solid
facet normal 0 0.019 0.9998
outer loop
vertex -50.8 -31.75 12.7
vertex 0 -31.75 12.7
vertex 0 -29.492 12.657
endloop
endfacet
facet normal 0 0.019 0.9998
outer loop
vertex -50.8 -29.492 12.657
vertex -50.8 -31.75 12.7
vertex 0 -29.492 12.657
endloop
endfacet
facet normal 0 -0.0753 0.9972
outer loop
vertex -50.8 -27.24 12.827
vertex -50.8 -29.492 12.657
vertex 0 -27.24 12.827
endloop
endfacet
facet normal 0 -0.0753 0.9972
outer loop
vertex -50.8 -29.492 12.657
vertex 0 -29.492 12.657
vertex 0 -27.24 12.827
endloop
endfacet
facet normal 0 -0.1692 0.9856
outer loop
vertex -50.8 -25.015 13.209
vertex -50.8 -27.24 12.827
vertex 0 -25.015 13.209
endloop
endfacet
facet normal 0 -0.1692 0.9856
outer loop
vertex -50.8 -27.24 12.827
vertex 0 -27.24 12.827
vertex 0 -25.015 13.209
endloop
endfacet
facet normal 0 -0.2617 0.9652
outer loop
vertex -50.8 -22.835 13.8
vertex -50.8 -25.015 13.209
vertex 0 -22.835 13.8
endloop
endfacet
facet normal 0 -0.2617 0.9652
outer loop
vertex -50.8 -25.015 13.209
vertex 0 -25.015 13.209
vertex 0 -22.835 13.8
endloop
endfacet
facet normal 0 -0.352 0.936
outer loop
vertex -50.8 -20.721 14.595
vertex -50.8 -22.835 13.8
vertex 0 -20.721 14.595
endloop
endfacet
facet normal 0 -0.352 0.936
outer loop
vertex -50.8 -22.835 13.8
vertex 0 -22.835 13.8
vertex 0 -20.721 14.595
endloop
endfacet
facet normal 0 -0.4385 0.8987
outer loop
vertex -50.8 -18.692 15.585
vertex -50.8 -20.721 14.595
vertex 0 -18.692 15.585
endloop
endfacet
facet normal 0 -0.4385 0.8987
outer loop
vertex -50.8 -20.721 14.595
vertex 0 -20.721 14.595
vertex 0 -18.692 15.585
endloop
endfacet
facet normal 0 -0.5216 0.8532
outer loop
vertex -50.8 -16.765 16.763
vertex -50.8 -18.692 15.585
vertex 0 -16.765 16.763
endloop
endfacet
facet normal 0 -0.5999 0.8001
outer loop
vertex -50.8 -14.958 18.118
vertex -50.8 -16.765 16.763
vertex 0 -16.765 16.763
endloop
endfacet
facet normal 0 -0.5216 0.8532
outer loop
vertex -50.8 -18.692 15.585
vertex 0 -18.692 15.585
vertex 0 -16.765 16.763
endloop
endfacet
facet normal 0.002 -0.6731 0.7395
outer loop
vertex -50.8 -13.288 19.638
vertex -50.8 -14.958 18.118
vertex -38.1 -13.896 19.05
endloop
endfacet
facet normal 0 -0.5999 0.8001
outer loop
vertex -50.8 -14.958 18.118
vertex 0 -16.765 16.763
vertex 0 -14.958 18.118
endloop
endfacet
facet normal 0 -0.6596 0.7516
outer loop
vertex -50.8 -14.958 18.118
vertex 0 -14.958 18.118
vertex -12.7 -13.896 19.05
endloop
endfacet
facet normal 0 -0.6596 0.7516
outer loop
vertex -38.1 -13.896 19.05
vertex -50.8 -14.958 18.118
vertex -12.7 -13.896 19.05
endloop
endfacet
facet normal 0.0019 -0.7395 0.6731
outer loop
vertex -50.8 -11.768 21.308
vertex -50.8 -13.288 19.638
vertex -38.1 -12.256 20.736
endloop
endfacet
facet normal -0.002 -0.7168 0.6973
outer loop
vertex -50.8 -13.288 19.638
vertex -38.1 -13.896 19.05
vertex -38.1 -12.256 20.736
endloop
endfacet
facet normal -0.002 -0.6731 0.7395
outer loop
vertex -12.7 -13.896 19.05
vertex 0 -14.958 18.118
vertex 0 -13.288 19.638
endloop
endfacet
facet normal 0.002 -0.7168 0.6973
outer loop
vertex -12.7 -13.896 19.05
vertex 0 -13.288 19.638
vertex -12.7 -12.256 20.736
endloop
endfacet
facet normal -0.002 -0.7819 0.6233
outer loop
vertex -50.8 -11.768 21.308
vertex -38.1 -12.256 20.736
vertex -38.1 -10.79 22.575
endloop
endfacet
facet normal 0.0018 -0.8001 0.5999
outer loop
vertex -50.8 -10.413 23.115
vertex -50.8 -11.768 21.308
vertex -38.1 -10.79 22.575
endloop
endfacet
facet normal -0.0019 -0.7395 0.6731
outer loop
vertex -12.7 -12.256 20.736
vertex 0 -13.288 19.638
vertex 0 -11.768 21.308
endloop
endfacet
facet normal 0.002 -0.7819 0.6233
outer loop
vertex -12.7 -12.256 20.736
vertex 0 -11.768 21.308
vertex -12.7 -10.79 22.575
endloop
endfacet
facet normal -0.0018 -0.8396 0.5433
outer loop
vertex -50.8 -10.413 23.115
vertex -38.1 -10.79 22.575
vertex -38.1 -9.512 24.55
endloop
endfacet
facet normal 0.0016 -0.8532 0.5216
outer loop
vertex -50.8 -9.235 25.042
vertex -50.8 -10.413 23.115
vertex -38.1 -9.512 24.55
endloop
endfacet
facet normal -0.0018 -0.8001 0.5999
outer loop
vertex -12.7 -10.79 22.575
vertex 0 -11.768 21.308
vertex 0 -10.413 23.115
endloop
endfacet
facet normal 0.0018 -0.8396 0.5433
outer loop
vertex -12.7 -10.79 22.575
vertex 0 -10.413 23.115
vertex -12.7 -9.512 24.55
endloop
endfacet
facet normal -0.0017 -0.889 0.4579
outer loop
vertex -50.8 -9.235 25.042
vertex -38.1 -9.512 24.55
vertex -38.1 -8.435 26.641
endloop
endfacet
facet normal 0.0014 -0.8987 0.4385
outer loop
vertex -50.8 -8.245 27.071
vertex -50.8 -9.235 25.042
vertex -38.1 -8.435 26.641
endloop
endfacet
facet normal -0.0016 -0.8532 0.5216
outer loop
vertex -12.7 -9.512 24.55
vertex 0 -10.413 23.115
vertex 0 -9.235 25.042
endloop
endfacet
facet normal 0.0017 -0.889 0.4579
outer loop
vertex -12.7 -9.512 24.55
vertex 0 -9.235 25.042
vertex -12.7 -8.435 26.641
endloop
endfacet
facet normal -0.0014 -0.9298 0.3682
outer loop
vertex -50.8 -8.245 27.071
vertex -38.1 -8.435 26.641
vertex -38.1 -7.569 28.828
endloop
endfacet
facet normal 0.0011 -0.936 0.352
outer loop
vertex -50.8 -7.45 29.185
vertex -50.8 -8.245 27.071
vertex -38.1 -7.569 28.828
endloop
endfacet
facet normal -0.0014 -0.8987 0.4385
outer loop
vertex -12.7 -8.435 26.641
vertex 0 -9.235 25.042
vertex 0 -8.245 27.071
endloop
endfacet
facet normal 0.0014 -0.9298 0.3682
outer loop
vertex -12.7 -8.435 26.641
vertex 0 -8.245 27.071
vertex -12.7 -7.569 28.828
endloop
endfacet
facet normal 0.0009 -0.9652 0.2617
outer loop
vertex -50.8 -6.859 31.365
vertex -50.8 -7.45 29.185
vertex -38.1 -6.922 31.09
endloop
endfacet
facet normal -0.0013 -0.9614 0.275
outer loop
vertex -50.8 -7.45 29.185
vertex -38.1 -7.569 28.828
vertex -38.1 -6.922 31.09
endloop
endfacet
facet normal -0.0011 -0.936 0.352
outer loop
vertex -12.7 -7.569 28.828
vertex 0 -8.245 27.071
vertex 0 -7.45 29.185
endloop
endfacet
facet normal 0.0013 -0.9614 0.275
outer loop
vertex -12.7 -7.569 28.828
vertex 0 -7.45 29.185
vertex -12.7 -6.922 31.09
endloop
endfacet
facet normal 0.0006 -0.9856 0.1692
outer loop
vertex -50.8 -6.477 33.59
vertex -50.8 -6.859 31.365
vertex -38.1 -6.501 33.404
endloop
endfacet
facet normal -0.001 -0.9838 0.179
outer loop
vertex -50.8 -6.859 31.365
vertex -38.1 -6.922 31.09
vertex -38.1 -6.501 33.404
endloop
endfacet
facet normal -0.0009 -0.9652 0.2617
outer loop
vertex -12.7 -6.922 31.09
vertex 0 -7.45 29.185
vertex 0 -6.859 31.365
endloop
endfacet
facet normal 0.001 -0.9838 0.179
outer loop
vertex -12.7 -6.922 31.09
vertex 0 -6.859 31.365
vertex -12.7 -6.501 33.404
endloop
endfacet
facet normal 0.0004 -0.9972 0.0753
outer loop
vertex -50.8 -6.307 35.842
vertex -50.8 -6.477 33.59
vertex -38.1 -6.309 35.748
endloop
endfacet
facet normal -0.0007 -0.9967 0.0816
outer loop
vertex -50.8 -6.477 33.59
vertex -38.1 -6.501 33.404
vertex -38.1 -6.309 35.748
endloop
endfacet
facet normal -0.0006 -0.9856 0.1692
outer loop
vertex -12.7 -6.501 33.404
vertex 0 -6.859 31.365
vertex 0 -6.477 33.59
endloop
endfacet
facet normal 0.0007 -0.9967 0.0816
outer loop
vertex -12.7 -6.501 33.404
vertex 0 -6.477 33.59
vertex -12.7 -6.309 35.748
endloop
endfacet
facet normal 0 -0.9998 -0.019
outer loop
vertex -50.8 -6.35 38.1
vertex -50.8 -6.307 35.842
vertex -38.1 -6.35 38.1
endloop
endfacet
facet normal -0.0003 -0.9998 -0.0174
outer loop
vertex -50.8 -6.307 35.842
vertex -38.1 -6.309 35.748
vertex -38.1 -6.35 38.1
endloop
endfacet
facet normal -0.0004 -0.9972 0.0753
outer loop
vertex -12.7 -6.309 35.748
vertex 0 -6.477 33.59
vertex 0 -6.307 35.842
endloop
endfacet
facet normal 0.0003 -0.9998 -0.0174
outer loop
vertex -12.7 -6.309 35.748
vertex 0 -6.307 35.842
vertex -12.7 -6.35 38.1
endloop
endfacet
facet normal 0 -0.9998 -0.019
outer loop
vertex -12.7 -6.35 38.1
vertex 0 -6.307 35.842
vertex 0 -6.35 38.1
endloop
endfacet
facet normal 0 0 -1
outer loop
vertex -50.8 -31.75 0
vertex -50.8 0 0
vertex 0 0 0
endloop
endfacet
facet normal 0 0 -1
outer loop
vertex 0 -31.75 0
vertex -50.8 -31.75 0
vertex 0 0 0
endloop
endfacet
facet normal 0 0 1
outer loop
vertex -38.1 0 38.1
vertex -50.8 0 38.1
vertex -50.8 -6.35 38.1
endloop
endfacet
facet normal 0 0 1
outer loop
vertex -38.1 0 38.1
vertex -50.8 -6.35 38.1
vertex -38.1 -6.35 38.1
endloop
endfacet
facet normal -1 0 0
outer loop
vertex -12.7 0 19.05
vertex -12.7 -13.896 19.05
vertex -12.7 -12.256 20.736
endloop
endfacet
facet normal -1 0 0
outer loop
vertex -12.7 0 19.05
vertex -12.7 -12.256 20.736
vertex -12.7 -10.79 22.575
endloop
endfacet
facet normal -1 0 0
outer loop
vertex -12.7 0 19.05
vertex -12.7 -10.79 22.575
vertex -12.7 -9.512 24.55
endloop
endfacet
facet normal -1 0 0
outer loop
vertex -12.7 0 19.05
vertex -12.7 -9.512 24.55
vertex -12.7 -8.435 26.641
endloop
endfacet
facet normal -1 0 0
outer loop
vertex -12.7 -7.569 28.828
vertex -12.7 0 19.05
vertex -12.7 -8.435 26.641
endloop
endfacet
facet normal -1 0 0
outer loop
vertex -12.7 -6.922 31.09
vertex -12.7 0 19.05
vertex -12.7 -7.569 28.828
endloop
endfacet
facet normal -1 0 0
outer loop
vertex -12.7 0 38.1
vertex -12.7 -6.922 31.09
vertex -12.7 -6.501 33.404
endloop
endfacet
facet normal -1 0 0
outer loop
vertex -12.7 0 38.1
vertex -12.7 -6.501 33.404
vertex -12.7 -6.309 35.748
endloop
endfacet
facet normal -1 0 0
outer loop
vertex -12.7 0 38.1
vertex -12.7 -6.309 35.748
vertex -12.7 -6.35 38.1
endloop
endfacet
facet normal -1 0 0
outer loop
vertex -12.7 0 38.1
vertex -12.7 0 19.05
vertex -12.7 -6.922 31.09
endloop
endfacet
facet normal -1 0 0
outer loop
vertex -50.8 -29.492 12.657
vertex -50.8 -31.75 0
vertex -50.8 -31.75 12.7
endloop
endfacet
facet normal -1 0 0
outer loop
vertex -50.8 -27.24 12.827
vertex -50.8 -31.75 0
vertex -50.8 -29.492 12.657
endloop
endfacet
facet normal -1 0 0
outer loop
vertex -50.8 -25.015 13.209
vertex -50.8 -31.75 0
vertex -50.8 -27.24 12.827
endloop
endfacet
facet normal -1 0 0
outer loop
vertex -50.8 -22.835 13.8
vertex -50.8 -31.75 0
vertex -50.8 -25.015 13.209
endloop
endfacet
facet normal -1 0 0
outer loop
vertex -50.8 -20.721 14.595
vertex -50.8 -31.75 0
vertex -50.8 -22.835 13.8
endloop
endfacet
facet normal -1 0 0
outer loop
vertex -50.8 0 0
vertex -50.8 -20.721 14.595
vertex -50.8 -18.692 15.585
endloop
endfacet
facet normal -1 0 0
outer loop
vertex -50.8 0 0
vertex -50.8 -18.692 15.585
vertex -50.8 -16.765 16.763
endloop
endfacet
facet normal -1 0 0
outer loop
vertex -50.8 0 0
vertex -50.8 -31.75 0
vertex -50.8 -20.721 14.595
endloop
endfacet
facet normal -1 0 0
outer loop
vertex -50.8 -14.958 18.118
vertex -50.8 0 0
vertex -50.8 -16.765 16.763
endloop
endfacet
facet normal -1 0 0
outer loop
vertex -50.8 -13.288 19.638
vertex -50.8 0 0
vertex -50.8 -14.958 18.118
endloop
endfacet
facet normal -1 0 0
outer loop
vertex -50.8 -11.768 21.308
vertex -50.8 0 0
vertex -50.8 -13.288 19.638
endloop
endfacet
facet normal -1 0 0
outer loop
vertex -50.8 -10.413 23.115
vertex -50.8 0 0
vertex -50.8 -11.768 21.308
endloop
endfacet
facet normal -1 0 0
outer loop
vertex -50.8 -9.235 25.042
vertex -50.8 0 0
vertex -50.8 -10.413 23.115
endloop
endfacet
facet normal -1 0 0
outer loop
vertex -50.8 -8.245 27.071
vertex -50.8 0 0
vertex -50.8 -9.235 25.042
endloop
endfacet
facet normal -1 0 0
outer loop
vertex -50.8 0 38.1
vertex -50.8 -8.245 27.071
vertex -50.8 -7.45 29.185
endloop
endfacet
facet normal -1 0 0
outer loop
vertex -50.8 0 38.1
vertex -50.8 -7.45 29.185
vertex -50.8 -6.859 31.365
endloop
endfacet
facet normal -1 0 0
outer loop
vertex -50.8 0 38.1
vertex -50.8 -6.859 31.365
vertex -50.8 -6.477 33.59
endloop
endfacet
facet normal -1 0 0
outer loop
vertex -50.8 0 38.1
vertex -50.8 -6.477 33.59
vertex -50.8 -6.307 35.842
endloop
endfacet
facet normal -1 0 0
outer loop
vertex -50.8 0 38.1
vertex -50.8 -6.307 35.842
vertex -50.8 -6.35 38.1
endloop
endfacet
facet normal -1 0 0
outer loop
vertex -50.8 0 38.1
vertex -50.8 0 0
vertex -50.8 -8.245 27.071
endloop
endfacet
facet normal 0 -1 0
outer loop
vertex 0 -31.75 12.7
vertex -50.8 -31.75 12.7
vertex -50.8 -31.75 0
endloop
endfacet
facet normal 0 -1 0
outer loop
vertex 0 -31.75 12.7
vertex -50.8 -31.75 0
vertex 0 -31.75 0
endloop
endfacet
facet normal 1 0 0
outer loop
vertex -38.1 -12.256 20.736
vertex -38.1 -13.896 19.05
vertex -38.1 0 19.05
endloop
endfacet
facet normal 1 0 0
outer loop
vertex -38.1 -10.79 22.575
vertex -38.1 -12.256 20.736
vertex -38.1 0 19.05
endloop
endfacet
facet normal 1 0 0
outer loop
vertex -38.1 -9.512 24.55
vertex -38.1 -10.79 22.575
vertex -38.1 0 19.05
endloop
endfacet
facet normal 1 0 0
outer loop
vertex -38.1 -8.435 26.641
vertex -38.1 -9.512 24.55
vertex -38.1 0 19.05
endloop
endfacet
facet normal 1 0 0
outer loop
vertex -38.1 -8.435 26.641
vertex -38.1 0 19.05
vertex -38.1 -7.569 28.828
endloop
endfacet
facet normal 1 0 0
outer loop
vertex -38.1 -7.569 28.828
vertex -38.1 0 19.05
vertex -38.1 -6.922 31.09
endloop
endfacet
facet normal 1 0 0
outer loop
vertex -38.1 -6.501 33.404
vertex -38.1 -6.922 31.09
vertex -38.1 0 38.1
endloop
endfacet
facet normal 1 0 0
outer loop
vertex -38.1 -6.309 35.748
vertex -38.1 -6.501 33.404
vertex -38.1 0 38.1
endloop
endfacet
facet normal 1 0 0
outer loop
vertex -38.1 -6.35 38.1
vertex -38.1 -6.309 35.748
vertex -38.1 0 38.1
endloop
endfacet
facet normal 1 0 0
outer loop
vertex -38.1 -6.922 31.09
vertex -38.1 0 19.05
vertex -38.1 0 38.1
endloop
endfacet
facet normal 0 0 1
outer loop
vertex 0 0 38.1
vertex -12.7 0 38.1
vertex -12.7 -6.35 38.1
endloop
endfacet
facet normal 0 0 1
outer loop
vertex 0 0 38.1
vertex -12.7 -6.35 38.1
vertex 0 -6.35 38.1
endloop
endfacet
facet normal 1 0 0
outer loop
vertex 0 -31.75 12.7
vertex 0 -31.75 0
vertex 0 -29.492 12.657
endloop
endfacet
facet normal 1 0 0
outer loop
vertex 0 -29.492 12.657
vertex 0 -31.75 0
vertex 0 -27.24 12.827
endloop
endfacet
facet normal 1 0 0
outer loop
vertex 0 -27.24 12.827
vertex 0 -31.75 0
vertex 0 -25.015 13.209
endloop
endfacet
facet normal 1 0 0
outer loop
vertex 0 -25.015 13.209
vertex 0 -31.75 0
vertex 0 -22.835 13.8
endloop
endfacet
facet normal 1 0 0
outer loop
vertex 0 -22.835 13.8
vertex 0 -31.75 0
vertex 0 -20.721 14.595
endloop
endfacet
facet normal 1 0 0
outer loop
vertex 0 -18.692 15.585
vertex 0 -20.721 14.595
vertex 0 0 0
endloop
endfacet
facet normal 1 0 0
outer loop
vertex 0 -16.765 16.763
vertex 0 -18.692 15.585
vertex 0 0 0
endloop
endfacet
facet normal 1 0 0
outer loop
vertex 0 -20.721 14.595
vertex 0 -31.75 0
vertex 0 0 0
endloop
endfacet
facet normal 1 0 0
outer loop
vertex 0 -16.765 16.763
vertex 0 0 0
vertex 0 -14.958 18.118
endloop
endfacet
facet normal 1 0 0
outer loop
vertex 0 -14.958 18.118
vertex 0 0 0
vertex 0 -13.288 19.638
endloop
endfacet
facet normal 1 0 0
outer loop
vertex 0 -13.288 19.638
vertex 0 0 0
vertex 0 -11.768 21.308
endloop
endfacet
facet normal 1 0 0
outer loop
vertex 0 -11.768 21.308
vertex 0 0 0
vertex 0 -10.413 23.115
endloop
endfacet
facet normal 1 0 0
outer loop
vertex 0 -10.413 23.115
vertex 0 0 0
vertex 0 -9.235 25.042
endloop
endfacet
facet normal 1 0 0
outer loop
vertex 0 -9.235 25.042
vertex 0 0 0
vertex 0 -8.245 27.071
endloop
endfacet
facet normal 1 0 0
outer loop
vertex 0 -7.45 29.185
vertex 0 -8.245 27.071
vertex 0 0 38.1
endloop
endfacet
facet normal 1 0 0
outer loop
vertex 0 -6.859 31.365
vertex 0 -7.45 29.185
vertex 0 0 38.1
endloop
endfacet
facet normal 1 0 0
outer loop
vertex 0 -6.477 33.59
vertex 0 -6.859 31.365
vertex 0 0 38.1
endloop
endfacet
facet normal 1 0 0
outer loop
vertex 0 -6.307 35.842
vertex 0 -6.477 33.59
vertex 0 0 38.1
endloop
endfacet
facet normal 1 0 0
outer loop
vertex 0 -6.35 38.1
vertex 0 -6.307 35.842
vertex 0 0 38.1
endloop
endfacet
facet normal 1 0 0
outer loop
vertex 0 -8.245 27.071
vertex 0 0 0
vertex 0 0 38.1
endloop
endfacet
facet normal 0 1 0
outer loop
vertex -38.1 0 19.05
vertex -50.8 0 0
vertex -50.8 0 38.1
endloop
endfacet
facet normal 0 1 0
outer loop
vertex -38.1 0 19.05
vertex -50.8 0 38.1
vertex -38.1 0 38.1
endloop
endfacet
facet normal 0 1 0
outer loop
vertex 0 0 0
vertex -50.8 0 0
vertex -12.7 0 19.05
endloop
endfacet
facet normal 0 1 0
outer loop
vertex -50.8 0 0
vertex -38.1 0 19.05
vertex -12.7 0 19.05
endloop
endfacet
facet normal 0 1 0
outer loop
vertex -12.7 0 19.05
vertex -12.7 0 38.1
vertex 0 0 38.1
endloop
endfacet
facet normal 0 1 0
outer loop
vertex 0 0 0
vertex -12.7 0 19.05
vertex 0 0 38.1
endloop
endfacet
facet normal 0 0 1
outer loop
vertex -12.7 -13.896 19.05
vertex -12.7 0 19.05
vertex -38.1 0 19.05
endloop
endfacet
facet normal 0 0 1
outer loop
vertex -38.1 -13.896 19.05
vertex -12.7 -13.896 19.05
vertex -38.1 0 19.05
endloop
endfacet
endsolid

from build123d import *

# Parameters (mm, degrees)
F0_W     = 50.8
F0_H     = 38.1
F1_DEPTH = 31.75
F3_DEPTH = 50.801
F4_W     = 25.4
F4_H     = 19.05
F5_DEPTH = 31.751


with BuildPart() as f1:
    # F0 (on Front) → F1 (new body)
    with BuildSketch(Plane.XZ):
        with Locations((-25.4, 19.05)):
            Rectangle(F0_W, F0_H)
    extrude(amount=F1_DEPTH)

    # F2 (on face) → F3 (cut, through all)
    with BuildSketch(Plane.YZ):
        with BuildLine():
            Line((-31.75, 38.1), (-31.75, 12.7))
            ThreePointArc((-31.75, 12.7), (-13.287516, 19.637516), (-6.35, 38.1))
            Line((-6.35, 38.1), (-31.75, 38.1))
        make_face()
    extrude(amount=-F3_DEPTH, mode=Mode.SUBTRACT)

    # F4 (on face) → F5 (cut, through all)
    with BuildSketch(Plane(origin=(0, 0, 0), x_dir=(-1, 0, 0), z_dir=(0, 1, 0))):
        with Locations((25.4, 28.575)):
            Rectangle(F4_W, F4_H)
    extrude(amount=-F5_DEPTH, mode=Mode.SUBTRACT)


solid = f1.part
